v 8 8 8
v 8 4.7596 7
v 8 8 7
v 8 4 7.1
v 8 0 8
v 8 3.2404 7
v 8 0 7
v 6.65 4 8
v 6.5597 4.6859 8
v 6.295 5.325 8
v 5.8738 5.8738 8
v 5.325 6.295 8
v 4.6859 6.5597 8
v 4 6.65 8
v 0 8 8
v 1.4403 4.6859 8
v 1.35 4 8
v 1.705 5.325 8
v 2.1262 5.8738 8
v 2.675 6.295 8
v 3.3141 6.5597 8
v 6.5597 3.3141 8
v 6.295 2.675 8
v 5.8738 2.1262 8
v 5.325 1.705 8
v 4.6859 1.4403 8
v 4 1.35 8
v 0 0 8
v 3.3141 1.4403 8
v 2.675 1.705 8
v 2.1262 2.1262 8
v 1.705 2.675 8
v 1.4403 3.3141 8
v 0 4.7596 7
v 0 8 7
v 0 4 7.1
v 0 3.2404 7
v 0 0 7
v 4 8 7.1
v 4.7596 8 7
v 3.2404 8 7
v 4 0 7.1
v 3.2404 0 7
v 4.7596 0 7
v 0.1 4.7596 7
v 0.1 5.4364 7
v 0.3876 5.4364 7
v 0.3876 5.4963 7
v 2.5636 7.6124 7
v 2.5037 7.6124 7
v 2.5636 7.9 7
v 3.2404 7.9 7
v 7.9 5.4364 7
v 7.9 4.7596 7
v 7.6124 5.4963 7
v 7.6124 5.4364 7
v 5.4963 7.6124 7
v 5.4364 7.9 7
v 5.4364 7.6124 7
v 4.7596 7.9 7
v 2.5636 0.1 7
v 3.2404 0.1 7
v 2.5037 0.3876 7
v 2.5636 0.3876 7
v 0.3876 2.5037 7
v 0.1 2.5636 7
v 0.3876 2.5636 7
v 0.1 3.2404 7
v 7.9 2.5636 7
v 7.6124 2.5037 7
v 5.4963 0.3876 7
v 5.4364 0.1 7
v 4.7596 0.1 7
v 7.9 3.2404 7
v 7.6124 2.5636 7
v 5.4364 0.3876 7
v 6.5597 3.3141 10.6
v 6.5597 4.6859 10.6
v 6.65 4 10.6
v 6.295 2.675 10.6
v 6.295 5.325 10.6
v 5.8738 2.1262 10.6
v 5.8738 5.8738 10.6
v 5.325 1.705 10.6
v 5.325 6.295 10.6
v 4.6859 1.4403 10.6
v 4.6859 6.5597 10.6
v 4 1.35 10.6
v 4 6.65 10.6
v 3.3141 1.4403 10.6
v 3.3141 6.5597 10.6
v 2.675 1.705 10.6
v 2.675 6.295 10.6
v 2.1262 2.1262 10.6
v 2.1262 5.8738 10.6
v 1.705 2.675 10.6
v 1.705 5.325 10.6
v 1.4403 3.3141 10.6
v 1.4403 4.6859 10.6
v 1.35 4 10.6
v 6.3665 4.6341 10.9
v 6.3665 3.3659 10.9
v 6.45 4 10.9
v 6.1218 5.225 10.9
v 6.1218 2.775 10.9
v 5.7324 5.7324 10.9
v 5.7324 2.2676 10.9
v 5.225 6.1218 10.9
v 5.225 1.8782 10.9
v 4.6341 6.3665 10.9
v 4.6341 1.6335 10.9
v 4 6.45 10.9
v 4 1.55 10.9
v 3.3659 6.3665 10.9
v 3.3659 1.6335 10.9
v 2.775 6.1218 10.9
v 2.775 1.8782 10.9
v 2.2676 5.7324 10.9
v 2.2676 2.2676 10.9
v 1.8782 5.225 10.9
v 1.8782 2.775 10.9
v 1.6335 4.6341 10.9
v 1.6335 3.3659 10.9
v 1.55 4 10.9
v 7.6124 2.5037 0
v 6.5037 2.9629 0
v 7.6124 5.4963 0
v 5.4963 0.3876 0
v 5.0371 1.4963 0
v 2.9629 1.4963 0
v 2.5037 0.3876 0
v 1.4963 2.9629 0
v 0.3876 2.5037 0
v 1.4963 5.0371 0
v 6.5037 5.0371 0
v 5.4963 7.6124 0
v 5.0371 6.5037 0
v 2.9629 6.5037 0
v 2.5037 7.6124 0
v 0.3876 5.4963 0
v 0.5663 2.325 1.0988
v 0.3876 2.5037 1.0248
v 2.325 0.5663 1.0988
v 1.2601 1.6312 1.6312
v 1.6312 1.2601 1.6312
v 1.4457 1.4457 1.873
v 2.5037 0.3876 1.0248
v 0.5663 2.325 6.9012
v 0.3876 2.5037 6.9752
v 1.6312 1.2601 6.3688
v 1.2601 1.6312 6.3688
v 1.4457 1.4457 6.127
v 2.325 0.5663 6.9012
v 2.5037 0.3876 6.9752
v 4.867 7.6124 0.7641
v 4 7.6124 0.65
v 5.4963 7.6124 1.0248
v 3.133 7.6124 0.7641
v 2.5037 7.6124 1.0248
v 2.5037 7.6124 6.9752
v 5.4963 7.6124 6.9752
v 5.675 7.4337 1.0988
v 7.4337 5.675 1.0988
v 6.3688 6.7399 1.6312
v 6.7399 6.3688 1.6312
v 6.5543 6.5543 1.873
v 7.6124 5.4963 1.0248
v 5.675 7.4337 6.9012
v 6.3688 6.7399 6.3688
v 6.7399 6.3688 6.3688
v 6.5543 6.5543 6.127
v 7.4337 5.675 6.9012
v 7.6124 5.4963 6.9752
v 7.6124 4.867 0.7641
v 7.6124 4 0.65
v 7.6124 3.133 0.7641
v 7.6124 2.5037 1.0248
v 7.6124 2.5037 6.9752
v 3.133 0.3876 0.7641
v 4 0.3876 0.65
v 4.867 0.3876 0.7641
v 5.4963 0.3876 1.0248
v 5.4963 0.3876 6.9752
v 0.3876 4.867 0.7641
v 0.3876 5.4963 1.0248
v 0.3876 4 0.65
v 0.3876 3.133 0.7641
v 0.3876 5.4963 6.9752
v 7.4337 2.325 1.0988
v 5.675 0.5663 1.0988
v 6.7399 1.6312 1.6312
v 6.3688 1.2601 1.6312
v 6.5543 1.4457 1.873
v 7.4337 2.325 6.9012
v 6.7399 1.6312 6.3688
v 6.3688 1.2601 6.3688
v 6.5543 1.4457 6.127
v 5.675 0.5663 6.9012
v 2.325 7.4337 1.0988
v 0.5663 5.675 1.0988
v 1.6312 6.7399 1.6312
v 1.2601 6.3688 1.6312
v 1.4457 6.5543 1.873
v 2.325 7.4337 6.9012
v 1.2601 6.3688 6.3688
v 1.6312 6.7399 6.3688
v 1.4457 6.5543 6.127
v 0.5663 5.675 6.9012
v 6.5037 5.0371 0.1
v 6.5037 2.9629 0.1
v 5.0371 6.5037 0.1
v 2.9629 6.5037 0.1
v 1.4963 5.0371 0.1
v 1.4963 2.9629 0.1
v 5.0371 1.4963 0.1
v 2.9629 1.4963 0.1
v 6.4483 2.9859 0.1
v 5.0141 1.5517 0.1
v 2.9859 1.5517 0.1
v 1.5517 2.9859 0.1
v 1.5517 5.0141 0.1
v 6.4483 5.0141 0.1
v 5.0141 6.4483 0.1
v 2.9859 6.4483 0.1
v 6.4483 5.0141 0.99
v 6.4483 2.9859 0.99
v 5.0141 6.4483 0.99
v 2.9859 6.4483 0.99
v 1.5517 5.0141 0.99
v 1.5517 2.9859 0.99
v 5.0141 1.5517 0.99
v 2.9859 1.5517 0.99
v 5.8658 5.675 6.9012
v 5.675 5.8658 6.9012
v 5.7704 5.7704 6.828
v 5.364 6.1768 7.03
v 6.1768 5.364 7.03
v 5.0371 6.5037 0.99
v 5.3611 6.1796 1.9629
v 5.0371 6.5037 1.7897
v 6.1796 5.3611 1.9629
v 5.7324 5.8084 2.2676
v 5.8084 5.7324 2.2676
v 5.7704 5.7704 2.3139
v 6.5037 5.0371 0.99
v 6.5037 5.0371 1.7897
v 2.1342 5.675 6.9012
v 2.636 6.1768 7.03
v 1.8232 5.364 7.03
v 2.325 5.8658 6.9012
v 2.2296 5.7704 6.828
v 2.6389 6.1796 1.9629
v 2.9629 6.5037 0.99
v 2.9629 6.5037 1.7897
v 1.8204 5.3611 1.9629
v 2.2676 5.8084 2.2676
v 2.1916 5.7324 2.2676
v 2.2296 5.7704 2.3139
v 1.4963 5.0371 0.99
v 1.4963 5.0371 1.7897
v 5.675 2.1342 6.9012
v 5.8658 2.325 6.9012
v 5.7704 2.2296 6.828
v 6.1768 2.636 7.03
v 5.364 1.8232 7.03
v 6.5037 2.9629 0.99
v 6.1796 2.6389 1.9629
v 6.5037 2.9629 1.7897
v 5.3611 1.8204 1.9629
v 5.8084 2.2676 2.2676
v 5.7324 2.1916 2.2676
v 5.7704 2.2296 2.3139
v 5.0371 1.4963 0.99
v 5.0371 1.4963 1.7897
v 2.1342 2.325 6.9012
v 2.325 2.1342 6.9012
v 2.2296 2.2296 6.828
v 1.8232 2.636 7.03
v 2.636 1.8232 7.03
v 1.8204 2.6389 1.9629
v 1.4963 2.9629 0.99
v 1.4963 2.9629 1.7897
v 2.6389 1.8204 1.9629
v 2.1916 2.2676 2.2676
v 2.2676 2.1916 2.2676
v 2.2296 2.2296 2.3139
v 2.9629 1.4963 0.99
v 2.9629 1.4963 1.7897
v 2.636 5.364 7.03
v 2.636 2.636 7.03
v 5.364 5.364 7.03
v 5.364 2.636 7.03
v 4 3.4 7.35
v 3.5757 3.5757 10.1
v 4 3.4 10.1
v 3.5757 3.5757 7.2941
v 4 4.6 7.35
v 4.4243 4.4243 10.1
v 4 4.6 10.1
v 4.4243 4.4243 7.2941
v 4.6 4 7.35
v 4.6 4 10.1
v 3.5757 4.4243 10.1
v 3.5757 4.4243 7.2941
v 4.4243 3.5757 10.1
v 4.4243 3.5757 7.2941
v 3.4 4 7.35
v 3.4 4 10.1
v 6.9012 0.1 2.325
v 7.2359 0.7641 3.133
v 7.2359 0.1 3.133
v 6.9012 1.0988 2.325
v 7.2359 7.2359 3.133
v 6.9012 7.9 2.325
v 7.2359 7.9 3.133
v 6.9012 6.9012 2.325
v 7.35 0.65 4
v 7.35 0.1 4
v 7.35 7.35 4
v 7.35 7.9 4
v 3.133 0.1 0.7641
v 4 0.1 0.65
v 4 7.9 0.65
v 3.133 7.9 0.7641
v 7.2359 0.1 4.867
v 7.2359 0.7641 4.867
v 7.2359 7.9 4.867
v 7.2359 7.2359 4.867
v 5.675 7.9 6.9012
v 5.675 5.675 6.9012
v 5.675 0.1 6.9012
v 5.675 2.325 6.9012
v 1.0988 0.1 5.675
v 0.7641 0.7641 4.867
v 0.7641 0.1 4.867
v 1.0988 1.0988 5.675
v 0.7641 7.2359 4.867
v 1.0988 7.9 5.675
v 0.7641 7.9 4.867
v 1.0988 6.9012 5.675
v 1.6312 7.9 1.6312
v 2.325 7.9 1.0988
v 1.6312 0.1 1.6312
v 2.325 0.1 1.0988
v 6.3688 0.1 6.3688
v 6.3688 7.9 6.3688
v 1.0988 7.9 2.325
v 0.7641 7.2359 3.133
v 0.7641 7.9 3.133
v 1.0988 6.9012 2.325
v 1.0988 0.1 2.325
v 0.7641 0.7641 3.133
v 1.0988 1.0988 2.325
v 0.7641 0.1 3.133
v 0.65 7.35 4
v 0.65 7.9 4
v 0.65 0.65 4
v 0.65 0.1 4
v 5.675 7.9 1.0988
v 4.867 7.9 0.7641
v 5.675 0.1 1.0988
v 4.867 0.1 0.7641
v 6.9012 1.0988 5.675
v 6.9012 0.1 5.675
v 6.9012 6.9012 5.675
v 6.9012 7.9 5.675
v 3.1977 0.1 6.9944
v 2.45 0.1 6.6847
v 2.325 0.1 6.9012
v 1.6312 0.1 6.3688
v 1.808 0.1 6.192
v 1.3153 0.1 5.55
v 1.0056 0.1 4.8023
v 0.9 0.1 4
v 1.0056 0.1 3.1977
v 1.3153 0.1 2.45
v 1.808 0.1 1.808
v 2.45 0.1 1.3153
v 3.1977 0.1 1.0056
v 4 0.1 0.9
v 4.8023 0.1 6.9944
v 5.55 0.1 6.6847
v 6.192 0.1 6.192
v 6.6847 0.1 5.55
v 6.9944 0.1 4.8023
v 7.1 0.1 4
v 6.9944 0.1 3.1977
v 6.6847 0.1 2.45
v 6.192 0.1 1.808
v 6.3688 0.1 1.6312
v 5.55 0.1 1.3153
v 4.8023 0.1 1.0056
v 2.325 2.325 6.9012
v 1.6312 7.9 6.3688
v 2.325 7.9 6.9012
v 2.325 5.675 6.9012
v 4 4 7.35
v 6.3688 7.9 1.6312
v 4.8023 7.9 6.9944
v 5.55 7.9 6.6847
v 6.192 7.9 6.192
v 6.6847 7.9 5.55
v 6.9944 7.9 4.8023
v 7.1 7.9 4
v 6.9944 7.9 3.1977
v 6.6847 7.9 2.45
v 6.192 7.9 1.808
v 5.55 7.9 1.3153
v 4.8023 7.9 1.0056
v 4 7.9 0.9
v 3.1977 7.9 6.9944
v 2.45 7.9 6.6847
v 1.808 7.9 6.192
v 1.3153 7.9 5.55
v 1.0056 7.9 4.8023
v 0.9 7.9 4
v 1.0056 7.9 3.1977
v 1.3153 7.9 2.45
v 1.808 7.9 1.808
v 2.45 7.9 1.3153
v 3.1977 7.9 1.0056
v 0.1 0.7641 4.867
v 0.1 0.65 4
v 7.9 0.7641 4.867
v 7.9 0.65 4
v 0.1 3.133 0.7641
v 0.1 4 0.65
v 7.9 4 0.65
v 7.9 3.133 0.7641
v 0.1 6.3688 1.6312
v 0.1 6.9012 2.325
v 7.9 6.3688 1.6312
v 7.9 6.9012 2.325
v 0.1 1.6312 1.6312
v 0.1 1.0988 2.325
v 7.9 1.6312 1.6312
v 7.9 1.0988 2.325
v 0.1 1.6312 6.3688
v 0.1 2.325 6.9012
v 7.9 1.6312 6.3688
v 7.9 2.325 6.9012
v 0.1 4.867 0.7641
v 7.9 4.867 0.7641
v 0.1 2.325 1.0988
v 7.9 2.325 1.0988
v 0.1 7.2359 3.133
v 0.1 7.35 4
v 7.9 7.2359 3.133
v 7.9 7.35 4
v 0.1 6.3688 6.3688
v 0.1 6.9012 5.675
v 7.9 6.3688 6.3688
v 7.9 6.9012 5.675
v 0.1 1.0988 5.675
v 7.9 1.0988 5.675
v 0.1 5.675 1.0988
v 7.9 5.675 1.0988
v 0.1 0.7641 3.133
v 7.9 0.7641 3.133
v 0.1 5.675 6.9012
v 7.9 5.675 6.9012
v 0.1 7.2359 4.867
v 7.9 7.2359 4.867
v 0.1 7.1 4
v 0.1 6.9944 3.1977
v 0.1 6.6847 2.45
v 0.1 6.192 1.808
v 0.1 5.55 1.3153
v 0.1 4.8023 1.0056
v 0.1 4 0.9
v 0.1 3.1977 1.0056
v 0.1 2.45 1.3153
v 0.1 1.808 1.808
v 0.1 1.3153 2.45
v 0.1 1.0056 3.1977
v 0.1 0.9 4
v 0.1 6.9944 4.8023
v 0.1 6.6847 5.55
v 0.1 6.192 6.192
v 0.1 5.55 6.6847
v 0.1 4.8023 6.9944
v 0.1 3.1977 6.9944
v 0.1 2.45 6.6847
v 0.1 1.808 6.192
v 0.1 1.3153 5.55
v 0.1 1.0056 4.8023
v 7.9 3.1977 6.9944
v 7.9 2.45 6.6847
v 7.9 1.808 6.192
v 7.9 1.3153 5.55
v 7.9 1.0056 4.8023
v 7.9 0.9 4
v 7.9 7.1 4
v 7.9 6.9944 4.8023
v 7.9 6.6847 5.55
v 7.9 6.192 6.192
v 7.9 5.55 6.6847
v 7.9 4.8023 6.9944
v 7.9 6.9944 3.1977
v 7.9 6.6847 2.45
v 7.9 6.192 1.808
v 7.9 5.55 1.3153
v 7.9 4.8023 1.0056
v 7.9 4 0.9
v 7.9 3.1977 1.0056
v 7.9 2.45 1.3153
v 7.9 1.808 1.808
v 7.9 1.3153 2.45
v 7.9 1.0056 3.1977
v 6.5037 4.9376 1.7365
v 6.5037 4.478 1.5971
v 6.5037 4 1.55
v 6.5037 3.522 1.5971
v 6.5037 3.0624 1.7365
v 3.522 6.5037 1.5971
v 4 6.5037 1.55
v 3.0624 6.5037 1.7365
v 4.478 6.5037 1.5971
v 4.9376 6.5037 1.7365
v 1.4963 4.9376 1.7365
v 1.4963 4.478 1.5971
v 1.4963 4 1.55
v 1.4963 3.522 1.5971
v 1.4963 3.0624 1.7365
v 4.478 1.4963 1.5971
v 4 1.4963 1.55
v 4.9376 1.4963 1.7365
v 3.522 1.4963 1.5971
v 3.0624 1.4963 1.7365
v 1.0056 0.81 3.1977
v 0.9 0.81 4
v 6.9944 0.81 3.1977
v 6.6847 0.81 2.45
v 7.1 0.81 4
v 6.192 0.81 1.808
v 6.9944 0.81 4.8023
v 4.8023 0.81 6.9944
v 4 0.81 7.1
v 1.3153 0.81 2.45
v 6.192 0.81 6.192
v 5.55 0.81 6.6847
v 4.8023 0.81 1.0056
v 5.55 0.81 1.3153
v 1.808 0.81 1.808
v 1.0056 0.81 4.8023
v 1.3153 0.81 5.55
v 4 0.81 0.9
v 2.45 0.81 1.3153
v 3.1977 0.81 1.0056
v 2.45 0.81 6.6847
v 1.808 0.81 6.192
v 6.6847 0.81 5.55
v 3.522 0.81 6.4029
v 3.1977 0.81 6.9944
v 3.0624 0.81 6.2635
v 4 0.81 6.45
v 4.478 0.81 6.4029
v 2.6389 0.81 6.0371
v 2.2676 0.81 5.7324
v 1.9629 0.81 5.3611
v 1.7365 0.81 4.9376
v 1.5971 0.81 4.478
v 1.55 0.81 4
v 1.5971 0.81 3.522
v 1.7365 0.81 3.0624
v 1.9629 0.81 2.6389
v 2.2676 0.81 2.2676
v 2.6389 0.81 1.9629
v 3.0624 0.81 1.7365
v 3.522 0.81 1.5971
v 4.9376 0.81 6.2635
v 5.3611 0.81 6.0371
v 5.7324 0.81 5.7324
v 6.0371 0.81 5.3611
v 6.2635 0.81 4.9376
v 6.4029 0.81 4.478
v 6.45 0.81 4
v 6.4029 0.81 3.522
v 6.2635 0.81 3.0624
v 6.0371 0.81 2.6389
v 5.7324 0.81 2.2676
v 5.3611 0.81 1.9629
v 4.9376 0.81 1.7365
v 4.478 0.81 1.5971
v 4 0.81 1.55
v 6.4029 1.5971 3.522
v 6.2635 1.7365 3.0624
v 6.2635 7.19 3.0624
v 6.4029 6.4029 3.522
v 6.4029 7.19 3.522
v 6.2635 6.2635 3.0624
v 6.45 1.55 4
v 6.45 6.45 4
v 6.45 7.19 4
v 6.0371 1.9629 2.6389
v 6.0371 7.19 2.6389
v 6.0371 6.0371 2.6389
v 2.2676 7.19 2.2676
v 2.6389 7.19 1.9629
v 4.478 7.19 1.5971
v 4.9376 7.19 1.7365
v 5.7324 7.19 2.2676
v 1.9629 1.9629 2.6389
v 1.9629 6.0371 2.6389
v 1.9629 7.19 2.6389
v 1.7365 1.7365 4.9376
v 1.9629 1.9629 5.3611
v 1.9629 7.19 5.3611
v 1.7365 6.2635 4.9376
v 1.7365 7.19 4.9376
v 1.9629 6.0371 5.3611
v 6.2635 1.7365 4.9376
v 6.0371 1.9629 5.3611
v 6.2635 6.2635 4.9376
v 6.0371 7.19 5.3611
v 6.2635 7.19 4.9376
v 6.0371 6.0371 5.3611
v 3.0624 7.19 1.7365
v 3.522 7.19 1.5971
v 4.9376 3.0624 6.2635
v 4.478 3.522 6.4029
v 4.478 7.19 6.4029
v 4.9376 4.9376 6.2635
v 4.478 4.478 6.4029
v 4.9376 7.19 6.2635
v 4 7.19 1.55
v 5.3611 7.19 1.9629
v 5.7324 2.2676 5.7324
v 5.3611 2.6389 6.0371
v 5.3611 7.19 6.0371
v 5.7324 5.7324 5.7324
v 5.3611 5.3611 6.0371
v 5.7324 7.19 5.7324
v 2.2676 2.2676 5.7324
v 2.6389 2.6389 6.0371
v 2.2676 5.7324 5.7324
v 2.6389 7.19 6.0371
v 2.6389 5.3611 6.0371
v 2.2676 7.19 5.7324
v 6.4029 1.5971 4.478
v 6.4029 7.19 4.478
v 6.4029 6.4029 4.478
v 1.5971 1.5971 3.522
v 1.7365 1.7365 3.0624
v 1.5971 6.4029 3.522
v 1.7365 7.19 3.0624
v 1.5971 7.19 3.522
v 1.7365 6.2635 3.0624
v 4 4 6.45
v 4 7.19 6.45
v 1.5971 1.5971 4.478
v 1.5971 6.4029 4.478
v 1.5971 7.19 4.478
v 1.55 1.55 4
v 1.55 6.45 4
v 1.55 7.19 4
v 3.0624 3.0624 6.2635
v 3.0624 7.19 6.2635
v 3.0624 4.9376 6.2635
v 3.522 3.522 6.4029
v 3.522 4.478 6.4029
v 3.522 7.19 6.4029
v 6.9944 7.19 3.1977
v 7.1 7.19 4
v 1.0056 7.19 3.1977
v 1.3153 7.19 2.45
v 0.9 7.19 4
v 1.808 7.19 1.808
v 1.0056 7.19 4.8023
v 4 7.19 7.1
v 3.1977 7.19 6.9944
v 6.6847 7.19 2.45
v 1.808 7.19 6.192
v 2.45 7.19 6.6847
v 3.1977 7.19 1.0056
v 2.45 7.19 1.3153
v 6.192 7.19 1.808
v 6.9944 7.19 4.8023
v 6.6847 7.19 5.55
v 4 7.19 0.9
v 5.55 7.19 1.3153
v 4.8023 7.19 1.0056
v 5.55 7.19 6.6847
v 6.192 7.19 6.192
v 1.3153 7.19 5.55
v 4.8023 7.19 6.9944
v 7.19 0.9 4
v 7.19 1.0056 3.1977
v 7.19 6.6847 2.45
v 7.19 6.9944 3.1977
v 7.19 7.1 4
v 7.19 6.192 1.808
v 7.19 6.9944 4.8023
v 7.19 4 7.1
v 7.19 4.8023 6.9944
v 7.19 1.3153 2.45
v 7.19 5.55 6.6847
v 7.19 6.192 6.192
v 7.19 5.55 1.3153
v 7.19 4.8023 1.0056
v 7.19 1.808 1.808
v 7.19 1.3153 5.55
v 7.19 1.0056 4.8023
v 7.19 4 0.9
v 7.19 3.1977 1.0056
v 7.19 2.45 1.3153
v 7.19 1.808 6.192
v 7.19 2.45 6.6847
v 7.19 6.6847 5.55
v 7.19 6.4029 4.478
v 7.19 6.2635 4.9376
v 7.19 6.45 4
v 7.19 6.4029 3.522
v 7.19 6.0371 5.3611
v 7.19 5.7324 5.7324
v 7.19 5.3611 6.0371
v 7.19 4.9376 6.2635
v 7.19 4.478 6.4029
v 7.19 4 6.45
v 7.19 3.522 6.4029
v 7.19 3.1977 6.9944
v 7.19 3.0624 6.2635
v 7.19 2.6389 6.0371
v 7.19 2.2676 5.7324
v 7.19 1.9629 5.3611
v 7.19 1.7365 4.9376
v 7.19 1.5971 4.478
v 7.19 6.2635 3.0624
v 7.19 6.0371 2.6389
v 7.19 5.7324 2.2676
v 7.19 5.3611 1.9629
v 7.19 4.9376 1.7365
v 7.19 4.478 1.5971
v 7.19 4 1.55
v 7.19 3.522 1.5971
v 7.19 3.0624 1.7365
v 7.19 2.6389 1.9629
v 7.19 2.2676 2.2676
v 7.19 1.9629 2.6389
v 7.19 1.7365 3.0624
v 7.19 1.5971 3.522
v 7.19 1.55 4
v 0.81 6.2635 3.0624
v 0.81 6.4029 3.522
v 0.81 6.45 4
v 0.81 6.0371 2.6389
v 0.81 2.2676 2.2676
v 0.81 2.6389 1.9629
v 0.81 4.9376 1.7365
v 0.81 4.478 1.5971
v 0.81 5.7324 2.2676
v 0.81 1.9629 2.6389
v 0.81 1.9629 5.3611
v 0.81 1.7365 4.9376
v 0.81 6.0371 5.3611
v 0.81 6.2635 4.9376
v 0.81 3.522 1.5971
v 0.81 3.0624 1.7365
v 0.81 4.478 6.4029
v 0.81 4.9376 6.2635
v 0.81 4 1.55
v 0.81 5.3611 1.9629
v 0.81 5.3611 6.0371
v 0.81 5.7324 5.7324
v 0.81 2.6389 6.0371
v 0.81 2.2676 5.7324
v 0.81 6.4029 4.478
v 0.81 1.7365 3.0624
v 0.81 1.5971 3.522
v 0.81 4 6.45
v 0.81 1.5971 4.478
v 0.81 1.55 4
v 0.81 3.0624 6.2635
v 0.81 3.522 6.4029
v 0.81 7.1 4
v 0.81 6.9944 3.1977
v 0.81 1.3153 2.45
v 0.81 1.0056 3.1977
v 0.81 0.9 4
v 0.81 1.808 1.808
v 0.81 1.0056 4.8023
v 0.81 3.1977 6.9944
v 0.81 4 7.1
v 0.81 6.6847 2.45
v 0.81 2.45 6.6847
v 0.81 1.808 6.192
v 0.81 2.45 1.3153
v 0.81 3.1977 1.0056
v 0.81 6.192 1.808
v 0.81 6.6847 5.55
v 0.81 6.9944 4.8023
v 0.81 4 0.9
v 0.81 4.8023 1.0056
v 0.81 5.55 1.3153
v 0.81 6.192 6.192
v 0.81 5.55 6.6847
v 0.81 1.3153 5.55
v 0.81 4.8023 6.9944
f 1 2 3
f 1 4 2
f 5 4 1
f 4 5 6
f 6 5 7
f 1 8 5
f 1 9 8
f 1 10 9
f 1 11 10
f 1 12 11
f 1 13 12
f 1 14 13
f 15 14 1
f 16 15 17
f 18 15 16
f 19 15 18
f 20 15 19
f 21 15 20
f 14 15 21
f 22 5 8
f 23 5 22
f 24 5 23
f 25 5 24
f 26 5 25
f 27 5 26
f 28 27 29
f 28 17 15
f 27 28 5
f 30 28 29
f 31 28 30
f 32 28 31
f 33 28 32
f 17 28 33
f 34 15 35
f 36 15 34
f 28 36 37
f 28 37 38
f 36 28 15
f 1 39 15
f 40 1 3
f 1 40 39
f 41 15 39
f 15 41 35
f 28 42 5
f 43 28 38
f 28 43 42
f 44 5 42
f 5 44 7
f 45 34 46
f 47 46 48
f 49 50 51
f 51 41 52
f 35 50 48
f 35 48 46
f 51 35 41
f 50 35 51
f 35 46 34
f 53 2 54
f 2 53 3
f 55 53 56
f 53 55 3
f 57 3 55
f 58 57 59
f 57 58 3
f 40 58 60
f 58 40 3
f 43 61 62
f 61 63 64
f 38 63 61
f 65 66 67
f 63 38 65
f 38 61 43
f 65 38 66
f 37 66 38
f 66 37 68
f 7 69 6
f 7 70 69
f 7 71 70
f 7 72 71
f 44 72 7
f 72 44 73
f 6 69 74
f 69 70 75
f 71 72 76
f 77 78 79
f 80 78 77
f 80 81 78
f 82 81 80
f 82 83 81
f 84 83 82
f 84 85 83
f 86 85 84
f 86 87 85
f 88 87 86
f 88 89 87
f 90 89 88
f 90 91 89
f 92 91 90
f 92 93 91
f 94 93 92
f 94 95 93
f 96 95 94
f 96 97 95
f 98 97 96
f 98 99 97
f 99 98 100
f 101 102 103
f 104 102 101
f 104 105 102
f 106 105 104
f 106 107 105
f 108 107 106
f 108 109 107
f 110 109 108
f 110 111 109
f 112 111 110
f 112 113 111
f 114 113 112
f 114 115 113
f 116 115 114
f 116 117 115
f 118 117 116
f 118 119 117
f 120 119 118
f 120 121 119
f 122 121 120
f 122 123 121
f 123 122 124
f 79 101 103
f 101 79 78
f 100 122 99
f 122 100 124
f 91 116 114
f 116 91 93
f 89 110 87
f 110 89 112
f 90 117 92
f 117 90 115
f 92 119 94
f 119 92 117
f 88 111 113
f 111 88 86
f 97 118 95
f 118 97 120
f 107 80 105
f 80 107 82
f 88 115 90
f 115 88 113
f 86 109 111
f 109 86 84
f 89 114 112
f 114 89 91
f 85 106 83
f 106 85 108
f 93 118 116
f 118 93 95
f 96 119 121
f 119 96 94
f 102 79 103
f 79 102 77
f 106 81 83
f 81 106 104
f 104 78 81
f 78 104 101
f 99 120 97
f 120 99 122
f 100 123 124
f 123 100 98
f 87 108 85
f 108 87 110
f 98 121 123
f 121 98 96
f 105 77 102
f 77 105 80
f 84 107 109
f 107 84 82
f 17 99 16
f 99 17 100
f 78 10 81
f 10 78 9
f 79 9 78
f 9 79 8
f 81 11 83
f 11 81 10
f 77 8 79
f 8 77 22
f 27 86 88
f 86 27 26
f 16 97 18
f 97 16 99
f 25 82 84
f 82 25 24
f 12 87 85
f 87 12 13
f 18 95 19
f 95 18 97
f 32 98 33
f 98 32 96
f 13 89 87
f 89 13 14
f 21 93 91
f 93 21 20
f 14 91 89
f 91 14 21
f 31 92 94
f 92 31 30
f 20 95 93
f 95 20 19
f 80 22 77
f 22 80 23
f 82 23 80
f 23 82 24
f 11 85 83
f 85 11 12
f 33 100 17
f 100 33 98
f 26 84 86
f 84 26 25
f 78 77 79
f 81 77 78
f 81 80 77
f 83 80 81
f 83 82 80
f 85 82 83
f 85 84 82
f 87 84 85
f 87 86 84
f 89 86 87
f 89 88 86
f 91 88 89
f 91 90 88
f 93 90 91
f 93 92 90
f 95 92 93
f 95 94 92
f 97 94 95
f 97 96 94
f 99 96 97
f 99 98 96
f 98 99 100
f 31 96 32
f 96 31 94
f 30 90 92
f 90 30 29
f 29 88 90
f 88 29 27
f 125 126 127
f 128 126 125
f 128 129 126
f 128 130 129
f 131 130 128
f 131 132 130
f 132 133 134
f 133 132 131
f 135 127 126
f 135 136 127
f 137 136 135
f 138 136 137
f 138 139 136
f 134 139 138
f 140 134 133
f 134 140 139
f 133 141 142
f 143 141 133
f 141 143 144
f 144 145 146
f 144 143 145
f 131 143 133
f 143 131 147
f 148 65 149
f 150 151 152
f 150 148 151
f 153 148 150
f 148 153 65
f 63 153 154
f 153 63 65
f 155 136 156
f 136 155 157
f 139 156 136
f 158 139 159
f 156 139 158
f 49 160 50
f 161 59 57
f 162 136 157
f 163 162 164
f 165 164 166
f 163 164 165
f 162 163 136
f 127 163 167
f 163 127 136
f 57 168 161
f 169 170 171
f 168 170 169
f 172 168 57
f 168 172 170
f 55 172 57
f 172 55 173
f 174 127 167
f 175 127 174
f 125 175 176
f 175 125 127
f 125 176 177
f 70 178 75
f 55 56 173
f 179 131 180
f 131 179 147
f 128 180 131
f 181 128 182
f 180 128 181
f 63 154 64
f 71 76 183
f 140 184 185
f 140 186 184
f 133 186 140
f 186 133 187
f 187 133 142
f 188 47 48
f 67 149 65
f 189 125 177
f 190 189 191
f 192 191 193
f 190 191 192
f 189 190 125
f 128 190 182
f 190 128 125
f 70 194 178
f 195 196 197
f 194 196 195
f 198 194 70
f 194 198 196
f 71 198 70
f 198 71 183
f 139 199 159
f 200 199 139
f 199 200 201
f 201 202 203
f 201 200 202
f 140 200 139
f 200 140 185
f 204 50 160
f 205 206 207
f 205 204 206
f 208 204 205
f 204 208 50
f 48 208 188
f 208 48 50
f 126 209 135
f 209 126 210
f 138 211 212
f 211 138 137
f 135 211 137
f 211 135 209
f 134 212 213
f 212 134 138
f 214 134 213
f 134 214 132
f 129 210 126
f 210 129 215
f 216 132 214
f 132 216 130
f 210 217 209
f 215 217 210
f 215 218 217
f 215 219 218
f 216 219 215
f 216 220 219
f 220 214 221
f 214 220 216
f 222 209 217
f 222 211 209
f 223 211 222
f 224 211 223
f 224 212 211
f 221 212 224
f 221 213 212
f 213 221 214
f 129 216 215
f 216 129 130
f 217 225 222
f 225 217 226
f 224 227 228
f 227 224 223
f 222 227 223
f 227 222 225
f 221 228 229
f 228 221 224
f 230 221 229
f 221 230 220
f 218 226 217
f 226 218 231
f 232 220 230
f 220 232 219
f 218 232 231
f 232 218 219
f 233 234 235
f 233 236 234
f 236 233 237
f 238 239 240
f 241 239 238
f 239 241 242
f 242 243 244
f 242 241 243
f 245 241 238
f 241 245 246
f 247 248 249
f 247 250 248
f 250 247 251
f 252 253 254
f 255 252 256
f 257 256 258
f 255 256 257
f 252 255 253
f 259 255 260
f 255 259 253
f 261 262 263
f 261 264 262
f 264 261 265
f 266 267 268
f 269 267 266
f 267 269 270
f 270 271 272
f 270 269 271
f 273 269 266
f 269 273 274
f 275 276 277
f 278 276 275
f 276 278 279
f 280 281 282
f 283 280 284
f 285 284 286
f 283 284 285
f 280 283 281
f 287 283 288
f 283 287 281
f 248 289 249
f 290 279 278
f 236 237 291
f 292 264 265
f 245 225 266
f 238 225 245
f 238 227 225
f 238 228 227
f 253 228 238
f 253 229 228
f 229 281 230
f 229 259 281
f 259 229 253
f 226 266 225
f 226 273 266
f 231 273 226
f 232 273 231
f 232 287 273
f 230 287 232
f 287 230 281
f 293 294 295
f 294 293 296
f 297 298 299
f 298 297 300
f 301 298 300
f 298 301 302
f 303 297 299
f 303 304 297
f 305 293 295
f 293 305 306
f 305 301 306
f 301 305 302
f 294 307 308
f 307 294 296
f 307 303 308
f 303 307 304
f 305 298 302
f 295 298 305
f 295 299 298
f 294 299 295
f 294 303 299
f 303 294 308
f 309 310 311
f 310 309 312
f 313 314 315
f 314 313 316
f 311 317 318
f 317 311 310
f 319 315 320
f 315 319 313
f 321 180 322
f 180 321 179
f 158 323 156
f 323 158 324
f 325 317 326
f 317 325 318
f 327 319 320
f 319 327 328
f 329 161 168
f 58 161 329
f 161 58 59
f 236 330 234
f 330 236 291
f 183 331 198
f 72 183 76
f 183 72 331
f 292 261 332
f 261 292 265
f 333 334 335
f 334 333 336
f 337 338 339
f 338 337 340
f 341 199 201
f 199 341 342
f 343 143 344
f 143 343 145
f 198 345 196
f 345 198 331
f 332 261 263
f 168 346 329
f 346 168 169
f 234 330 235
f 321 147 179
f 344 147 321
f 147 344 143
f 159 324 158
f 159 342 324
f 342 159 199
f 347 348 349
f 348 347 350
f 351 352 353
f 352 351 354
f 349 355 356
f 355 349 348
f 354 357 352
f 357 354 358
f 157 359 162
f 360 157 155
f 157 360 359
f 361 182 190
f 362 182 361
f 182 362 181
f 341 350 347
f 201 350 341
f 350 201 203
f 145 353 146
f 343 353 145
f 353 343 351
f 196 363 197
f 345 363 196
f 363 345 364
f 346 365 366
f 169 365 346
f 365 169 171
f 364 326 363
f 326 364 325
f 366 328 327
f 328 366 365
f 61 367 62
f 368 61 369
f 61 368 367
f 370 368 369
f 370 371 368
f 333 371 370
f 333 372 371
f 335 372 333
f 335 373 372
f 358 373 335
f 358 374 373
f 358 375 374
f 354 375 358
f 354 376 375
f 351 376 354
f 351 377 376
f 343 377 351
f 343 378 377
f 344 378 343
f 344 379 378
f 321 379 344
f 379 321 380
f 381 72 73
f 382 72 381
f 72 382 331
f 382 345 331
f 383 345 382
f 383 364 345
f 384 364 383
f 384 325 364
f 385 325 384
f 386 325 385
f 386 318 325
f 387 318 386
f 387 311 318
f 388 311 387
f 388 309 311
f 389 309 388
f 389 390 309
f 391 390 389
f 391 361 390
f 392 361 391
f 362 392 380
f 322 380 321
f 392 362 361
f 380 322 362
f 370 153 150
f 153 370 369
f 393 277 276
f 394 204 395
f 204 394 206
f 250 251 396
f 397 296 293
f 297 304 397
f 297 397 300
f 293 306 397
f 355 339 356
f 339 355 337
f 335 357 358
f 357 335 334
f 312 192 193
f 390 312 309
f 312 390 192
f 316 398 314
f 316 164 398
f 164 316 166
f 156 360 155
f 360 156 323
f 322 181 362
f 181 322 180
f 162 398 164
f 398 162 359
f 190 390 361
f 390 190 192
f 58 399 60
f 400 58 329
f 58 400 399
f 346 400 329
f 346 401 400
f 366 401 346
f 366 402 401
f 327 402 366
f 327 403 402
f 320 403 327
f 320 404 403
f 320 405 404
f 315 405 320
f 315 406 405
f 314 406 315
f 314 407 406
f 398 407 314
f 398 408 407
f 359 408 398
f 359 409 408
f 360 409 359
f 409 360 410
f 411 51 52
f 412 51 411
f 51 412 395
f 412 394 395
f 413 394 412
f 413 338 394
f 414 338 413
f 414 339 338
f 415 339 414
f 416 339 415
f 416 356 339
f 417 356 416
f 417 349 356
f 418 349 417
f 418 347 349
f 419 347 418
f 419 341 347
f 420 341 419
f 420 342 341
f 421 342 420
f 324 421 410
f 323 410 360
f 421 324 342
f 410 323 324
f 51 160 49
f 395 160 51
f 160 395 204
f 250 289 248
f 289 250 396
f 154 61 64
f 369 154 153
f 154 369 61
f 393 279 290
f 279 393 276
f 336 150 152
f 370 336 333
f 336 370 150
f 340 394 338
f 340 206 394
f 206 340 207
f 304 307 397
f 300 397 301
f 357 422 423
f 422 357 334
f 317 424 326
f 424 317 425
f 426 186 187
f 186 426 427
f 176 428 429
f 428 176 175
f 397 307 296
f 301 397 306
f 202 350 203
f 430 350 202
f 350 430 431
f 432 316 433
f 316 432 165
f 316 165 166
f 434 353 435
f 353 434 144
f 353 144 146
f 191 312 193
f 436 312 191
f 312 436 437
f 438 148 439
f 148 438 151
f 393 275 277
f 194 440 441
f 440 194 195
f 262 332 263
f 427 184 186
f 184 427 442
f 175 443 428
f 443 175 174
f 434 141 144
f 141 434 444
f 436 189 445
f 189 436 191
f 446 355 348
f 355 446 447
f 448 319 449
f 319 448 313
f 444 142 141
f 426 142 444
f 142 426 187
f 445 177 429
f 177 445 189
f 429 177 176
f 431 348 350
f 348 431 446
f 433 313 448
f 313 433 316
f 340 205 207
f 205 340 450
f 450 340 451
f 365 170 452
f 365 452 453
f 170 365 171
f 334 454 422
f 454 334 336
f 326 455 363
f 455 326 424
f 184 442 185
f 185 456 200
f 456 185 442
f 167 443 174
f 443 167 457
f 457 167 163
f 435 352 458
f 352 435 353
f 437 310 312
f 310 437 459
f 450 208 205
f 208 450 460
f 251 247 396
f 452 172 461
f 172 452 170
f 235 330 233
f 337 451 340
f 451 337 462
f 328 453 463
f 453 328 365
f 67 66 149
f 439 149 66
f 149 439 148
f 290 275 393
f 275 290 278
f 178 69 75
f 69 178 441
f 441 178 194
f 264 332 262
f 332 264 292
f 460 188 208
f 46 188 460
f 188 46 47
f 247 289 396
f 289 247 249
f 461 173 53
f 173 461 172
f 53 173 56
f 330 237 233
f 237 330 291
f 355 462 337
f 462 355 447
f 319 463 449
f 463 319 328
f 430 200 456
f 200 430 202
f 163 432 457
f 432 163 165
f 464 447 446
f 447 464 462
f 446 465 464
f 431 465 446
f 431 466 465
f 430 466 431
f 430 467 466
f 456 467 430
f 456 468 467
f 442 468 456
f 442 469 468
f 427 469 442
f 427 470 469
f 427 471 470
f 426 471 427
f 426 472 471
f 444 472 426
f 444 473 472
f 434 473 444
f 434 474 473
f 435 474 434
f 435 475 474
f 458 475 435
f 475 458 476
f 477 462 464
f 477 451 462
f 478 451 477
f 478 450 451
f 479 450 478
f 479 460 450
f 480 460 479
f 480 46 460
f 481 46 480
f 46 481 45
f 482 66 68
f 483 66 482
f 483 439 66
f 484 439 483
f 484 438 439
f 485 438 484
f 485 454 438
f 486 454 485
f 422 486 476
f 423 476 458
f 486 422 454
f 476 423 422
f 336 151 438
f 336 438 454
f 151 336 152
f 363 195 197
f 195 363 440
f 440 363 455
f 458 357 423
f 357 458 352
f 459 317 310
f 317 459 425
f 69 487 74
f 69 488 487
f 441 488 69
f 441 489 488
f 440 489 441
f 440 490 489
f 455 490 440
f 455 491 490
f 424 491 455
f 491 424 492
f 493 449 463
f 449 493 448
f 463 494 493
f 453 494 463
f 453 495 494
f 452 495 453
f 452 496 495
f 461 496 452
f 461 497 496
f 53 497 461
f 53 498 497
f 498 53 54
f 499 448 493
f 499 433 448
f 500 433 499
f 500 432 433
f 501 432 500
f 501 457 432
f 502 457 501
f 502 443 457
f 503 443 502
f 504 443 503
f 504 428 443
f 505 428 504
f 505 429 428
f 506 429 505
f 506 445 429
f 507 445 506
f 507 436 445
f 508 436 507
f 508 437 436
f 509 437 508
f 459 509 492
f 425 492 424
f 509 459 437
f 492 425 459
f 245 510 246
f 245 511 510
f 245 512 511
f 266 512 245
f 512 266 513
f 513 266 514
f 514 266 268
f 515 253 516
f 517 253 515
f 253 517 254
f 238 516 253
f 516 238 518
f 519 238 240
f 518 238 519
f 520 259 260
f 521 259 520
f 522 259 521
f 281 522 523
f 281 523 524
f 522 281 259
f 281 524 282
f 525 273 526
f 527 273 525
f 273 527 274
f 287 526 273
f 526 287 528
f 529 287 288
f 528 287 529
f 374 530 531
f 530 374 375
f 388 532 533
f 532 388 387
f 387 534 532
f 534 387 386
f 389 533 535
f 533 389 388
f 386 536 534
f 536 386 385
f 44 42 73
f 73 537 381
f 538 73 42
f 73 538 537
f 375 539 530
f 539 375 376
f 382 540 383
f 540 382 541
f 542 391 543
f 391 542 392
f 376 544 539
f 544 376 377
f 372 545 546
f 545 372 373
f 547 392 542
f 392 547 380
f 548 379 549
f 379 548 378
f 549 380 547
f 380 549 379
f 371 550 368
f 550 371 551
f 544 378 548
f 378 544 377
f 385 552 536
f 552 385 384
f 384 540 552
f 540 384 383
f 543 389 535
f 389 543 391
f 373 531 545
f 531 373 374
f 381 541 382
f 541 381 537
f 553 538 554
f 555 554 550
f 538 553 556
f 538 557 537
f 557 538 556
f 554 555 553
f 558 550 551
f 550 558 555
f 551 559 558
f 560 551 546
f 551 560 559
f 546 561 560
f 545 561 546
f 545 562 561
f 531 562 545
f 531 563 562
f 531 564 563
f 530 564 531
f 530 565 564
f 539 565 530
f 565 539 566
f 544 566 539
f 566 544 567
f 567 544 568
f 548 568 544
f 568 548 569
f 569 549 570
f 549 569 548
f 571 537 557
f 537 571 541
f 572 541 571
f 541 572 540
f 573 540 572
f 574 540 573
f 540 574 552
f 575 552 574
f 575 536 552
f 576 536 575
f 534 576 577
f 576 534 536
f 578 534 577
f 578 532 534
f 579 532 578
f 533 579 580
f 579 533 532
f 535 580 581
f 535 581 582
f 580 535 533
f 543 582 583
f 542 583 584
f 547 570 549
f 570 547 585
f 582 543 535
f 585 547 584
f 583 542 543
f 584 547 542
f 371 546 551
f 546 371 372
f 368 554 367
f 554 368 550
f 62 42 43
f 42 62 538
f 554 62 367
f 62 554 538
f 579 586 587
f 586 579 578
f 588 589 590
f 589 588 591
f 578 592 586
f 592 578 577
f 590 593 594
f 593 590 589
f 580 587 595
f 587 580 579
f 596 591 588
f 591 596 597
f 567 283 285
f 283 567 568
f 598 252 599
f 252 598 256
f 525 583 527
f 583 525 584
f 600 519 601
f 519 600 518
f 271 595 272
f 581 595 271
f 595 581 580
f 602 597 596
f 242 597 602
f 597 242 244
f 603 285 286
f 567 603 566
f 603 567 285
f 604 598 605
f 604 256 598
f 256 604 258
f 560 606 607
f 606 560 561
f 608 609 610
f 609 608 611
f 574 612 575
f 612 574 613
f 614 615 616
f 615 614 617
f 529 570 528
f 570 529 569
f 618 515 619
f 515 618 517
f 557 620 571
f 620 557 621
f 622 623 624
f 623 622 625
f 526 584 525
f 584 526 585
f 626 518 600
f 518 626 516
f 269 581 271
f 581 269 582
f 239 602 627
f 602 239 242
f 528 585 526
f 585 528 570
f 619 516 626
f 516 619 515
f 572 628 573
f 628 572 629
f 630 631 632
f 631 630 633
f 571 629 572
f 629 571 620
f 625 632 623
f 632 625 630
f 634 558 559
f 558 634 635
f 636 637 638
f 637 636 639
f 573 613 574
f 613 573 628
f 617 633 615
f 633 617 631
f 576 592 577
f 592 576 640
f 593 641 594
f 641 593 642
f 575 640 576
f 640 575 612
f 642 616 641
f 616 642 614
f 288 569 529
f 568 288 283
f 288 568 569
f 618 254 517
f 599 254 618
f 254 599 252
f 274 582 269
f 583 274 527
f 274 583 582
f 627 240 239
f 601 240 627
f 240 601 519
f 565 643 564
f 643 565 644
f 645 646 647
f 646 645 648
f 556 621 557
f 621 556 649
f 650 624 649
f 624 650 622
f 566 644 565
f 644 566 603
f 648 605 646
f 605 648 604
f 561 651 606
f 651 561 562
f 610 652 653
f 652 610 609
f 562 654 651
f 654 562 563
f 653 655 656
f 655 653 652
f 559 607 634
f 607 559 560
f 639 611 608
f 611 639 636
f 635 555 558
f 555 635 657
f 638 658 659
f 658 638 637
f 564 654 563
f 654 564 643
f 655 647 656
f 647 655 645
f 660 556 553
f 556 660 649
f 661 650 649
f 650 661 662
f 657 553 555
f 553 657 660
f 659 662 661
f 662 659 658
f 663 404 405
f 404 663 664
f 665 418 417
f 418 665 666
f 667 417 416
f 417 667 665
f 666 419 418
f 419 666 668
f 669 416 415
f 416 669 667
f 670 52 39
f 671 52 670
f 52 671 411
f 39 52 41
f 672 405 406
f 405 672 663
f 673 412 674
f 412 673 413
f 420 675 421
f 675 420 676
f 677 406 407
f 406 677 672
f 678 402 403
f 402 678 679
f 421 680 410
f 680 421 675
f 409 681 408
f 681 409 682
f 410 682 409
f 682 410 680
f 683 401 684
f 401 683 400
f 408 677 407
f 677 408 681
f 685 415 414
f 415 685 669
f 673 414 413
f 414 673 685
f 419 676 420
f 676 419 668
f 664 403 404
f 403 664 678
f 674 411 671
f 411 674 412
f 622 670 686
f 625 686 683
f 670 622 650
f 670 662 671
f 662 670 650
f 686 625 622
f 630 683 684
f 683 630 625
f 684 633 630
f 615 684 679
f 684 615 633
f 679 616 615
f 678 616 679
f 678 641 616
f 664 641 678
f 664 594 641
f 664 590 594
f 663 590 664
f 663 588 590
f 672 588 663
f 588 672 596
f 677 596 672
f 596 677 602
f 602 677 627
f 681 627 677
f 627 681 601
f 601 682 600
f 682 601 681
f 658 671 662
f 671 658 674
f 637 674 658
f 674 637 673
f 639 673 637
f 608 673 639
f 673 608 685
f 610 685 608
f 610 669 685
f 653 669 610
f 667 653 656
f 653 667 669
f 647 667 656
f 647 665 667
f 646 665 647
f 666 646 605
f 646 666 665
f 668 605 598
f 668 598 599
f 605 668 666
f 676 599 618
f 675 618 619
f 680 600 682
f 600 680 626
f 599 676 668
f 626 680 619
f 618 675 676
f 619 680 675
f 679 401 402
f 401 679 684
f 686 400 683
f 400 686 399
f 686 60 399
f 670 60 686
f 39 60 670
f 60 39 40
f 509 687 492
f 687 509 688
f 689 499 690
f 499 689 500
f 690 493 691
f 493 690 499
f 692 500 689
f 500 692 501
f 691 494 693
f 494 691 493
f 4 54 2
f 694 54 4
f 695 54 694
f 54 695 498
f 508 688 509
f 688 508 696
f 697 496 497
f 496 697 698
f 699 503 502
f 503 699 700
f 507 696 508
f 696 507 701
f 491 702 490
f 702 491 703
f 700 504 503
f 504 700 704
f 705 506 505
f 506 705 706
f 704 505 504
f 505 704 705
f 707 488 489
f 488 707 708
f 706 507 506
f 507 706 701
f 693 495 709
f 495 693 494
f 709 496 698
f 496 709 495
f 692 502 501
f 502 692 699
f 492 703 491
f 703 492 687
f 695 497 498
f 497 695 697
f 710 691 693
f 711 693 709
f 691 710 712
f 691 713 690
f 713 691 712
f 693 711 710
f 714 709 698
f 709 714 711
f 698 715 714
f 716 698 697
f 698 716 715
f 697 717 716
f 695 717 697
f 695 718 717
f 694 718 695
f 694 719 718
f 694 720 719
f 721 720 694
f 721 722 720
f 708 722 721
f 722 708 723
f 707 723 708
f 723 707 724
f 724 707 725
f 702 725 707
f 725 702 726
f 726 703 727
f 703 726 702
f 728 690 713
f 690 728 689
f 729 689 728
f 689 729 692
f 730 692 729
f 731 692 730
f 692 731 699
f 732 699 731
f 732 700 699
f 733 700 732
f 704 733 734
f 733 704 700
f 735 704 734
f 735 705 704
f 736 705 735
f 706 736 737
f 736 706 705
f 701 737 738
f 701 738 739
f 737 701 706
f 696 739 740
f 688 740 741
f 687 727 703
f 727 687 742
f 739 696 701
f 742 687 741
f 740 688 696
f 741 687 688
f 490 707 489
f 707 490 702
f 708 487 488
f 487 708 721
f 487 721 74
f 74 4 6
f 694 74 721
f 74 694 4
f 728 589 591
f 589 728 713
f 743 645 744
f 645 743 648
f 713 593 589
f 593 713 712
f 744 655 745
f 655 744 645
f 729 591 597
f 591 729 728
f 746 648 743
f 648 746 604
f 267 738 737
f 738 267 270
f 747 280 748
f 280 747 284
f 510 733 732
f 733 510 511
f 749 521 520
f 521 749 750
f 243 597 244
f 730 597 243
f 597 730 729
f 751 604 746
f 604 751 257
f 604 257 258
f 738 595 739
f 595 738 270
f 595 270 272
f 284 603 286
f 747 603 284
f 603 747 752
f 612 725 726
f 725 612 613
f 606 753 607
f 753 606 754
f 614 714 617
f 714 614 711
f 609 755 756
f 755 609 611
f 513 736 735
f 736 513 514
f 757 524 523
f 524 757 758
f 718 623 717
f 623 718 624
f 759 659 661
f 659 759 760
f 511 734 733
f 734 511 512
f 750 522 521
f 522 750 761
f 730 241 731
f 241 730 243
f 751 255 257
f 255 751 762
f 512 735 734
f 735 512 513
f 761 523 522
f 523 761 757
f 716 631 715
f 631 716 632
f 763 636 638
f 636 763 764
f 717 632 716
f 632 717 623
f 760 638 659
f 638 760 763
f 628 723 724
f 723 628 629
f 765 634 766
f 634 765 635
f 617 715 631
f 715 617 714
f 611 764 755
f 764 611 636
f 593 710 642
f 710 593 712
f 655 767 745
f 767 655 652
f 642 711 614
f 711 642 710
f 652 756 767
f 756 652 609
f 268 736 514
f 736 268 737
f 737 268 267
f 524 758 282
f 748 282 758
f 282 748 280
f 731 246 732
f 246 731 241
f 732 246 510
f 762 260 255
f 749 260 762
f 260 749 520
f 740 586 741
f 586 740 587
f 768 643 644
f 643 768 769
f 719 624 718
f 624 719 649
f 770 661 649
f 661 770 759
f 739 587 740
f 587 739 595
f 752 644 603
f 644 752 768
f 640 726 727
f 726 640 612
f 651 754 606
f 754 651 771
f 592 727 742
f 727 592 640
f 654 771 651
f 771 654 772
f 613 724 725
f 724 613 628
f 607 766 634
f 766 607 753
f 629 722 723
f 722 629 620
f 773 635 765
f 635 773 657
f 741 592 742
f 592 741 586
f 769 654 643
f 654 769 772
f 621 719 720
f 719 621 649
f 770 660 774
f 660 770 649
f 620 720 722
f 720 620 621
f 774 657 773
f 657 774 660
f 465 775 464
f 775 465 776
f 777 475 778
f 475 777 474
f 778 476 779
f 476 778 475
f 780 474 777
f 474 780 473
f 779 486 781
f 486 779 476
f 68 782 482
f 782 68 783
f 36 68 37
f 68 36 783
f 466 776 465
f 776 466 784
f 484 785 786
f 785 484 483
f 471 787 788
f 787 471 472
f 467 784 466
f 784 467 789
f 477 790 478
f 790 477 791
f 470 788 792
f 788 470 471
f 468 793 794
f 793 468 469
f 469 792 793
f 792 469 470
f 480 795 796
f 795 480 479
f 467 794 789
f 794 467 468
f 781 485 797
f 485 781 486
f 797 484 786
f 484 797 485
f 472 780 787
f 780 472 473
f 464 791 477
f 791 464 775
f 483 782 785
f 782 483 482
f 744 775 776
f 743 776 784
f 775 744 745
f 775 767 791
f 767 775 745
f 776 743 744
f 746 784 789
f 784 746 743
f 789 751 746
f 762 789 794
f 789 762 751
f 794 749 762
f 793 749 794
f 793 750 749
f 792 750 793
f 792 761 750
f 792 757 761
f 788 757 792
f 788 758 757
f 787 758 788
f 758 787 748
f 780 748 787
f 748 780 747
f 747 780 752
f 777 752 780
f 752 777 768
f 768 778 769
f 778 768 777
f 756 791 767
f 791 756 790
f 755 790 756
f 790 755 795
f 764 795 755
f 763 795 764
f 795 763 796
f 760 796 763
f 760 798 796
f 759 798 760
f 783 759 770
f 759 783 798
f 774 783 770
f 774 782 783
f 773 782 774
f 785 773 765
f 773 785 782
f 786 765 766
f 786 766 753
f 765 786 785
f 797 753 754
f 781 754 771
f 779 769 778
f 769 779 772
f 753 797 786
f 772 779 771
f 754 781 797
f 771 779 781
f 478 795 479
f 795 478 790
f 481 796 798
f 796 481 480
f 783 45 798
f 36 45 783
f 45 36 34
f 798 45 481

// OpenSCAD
/*
PELA 1x1x1 Parametric Block with LEGO-compatible technic connectors

PELA Parametric Blocks - 3D Printed LEGO-compatible parametric blocks

Published at https://PELAblocks.org

By Paul Houghton
Twitter: @mobile_rat
Email: paulirotta@gmail.com
Blog: https://medium.com/@paulhoughton

Creative Commons Attribution-ShareAlike 4.0 International License
    https://creativecommons.org/licenses/by-sa/4.0/legalcode

Open source design, Powered By Futurice. Come work with the best.
    https://www.futurice.com/

Import this into other design files:
    include <parameters.scad>
    use <technic.scad>
    
All modules have sensible defaults derived from <parameters.scad>. 
You can ignore values you are not tampering with and only need to pass a
parameter if you are overriding.

All modules are setup for stateless functional-style reuse in other OpenSCAD files.
To this end, you can always pass in and override all parameters to create
a new effect. Doing this is not natural to OpenSCAD, so apologies for all
the boilerplate arguments which are passed in to each module or any errors
that may be hidden by the sensible default values. This is an evolving art.
*/

include <../parameters.scad>
include <../print-parameters.scad>
use <../block.scad>
use <../technic-block.scad>

/* [PELA-compatible Options] */

// What type of top connector
top_type = 3; // [0:flat, 1:knob, 2:vented knob, 3:screw hole]

// What type of bottom connector
bottom_type = 1; // [0:flat, 1:socket, 2:screw hole]

technic_sides = false;

technic_ends = false;

panel = false;

sockets = true;

/////////////////////////////////////
// PELA display
/////////////////////////////////////

PELA_single_block();


/////////////////////////////////////
// MODULES
/////////////////////////////////////

// A PELA block with optional side and top vent holes
module PELA_single_block(panel=panel, top_type=top_type, bottom_type=bottom_type, technic_sides=technic_sides, technic_ends=technic_ends) {

    if (top_type == 0) {
        knobs = false;
        bolt_holes = false;
    } else if (top_type == 1) {
        knobs = true;
        bolt_holes = false;
        knob_vent_radius = 0;
    } else if (top_type == 2) {
        knobs = true;
        bolt_holes = false;
        knob_vent_radius = 1.2;
    } else if (top_type == 3) {
        knobs = false;
        bolt_holes = true;
    }

    if (bottom_type == 0) {
        solid_bottom_layer = true;
    }

    if (technic_sides) {
        side_holes = 3;
        side_sheaths = true;
    } else {
        side_holes = 0;
    }

    if (technic_ends) {
        end_holes = 3;
        end_sheaths = true;
    } else {
        end_holes = 0;
    }

    PELA_technic_block(l=1, w=1, h=1, sockets=sockets, knobs=knobs, knob_vent_radius=knob_vent_radius, panel=panel, bolt_holes=bolt_holes, bolt_hole_radius=bolt_hole_radius, ridge_width=ridge_width, ridge_depth=ridge_depth, side_holes=side_holes, side_sheaths=side_sheaths, end_holes=end_holes, end_sheaths=end_sheaths, solid_bottom_layer=solid_bottom_layer, skin=0, shell=0);
}
